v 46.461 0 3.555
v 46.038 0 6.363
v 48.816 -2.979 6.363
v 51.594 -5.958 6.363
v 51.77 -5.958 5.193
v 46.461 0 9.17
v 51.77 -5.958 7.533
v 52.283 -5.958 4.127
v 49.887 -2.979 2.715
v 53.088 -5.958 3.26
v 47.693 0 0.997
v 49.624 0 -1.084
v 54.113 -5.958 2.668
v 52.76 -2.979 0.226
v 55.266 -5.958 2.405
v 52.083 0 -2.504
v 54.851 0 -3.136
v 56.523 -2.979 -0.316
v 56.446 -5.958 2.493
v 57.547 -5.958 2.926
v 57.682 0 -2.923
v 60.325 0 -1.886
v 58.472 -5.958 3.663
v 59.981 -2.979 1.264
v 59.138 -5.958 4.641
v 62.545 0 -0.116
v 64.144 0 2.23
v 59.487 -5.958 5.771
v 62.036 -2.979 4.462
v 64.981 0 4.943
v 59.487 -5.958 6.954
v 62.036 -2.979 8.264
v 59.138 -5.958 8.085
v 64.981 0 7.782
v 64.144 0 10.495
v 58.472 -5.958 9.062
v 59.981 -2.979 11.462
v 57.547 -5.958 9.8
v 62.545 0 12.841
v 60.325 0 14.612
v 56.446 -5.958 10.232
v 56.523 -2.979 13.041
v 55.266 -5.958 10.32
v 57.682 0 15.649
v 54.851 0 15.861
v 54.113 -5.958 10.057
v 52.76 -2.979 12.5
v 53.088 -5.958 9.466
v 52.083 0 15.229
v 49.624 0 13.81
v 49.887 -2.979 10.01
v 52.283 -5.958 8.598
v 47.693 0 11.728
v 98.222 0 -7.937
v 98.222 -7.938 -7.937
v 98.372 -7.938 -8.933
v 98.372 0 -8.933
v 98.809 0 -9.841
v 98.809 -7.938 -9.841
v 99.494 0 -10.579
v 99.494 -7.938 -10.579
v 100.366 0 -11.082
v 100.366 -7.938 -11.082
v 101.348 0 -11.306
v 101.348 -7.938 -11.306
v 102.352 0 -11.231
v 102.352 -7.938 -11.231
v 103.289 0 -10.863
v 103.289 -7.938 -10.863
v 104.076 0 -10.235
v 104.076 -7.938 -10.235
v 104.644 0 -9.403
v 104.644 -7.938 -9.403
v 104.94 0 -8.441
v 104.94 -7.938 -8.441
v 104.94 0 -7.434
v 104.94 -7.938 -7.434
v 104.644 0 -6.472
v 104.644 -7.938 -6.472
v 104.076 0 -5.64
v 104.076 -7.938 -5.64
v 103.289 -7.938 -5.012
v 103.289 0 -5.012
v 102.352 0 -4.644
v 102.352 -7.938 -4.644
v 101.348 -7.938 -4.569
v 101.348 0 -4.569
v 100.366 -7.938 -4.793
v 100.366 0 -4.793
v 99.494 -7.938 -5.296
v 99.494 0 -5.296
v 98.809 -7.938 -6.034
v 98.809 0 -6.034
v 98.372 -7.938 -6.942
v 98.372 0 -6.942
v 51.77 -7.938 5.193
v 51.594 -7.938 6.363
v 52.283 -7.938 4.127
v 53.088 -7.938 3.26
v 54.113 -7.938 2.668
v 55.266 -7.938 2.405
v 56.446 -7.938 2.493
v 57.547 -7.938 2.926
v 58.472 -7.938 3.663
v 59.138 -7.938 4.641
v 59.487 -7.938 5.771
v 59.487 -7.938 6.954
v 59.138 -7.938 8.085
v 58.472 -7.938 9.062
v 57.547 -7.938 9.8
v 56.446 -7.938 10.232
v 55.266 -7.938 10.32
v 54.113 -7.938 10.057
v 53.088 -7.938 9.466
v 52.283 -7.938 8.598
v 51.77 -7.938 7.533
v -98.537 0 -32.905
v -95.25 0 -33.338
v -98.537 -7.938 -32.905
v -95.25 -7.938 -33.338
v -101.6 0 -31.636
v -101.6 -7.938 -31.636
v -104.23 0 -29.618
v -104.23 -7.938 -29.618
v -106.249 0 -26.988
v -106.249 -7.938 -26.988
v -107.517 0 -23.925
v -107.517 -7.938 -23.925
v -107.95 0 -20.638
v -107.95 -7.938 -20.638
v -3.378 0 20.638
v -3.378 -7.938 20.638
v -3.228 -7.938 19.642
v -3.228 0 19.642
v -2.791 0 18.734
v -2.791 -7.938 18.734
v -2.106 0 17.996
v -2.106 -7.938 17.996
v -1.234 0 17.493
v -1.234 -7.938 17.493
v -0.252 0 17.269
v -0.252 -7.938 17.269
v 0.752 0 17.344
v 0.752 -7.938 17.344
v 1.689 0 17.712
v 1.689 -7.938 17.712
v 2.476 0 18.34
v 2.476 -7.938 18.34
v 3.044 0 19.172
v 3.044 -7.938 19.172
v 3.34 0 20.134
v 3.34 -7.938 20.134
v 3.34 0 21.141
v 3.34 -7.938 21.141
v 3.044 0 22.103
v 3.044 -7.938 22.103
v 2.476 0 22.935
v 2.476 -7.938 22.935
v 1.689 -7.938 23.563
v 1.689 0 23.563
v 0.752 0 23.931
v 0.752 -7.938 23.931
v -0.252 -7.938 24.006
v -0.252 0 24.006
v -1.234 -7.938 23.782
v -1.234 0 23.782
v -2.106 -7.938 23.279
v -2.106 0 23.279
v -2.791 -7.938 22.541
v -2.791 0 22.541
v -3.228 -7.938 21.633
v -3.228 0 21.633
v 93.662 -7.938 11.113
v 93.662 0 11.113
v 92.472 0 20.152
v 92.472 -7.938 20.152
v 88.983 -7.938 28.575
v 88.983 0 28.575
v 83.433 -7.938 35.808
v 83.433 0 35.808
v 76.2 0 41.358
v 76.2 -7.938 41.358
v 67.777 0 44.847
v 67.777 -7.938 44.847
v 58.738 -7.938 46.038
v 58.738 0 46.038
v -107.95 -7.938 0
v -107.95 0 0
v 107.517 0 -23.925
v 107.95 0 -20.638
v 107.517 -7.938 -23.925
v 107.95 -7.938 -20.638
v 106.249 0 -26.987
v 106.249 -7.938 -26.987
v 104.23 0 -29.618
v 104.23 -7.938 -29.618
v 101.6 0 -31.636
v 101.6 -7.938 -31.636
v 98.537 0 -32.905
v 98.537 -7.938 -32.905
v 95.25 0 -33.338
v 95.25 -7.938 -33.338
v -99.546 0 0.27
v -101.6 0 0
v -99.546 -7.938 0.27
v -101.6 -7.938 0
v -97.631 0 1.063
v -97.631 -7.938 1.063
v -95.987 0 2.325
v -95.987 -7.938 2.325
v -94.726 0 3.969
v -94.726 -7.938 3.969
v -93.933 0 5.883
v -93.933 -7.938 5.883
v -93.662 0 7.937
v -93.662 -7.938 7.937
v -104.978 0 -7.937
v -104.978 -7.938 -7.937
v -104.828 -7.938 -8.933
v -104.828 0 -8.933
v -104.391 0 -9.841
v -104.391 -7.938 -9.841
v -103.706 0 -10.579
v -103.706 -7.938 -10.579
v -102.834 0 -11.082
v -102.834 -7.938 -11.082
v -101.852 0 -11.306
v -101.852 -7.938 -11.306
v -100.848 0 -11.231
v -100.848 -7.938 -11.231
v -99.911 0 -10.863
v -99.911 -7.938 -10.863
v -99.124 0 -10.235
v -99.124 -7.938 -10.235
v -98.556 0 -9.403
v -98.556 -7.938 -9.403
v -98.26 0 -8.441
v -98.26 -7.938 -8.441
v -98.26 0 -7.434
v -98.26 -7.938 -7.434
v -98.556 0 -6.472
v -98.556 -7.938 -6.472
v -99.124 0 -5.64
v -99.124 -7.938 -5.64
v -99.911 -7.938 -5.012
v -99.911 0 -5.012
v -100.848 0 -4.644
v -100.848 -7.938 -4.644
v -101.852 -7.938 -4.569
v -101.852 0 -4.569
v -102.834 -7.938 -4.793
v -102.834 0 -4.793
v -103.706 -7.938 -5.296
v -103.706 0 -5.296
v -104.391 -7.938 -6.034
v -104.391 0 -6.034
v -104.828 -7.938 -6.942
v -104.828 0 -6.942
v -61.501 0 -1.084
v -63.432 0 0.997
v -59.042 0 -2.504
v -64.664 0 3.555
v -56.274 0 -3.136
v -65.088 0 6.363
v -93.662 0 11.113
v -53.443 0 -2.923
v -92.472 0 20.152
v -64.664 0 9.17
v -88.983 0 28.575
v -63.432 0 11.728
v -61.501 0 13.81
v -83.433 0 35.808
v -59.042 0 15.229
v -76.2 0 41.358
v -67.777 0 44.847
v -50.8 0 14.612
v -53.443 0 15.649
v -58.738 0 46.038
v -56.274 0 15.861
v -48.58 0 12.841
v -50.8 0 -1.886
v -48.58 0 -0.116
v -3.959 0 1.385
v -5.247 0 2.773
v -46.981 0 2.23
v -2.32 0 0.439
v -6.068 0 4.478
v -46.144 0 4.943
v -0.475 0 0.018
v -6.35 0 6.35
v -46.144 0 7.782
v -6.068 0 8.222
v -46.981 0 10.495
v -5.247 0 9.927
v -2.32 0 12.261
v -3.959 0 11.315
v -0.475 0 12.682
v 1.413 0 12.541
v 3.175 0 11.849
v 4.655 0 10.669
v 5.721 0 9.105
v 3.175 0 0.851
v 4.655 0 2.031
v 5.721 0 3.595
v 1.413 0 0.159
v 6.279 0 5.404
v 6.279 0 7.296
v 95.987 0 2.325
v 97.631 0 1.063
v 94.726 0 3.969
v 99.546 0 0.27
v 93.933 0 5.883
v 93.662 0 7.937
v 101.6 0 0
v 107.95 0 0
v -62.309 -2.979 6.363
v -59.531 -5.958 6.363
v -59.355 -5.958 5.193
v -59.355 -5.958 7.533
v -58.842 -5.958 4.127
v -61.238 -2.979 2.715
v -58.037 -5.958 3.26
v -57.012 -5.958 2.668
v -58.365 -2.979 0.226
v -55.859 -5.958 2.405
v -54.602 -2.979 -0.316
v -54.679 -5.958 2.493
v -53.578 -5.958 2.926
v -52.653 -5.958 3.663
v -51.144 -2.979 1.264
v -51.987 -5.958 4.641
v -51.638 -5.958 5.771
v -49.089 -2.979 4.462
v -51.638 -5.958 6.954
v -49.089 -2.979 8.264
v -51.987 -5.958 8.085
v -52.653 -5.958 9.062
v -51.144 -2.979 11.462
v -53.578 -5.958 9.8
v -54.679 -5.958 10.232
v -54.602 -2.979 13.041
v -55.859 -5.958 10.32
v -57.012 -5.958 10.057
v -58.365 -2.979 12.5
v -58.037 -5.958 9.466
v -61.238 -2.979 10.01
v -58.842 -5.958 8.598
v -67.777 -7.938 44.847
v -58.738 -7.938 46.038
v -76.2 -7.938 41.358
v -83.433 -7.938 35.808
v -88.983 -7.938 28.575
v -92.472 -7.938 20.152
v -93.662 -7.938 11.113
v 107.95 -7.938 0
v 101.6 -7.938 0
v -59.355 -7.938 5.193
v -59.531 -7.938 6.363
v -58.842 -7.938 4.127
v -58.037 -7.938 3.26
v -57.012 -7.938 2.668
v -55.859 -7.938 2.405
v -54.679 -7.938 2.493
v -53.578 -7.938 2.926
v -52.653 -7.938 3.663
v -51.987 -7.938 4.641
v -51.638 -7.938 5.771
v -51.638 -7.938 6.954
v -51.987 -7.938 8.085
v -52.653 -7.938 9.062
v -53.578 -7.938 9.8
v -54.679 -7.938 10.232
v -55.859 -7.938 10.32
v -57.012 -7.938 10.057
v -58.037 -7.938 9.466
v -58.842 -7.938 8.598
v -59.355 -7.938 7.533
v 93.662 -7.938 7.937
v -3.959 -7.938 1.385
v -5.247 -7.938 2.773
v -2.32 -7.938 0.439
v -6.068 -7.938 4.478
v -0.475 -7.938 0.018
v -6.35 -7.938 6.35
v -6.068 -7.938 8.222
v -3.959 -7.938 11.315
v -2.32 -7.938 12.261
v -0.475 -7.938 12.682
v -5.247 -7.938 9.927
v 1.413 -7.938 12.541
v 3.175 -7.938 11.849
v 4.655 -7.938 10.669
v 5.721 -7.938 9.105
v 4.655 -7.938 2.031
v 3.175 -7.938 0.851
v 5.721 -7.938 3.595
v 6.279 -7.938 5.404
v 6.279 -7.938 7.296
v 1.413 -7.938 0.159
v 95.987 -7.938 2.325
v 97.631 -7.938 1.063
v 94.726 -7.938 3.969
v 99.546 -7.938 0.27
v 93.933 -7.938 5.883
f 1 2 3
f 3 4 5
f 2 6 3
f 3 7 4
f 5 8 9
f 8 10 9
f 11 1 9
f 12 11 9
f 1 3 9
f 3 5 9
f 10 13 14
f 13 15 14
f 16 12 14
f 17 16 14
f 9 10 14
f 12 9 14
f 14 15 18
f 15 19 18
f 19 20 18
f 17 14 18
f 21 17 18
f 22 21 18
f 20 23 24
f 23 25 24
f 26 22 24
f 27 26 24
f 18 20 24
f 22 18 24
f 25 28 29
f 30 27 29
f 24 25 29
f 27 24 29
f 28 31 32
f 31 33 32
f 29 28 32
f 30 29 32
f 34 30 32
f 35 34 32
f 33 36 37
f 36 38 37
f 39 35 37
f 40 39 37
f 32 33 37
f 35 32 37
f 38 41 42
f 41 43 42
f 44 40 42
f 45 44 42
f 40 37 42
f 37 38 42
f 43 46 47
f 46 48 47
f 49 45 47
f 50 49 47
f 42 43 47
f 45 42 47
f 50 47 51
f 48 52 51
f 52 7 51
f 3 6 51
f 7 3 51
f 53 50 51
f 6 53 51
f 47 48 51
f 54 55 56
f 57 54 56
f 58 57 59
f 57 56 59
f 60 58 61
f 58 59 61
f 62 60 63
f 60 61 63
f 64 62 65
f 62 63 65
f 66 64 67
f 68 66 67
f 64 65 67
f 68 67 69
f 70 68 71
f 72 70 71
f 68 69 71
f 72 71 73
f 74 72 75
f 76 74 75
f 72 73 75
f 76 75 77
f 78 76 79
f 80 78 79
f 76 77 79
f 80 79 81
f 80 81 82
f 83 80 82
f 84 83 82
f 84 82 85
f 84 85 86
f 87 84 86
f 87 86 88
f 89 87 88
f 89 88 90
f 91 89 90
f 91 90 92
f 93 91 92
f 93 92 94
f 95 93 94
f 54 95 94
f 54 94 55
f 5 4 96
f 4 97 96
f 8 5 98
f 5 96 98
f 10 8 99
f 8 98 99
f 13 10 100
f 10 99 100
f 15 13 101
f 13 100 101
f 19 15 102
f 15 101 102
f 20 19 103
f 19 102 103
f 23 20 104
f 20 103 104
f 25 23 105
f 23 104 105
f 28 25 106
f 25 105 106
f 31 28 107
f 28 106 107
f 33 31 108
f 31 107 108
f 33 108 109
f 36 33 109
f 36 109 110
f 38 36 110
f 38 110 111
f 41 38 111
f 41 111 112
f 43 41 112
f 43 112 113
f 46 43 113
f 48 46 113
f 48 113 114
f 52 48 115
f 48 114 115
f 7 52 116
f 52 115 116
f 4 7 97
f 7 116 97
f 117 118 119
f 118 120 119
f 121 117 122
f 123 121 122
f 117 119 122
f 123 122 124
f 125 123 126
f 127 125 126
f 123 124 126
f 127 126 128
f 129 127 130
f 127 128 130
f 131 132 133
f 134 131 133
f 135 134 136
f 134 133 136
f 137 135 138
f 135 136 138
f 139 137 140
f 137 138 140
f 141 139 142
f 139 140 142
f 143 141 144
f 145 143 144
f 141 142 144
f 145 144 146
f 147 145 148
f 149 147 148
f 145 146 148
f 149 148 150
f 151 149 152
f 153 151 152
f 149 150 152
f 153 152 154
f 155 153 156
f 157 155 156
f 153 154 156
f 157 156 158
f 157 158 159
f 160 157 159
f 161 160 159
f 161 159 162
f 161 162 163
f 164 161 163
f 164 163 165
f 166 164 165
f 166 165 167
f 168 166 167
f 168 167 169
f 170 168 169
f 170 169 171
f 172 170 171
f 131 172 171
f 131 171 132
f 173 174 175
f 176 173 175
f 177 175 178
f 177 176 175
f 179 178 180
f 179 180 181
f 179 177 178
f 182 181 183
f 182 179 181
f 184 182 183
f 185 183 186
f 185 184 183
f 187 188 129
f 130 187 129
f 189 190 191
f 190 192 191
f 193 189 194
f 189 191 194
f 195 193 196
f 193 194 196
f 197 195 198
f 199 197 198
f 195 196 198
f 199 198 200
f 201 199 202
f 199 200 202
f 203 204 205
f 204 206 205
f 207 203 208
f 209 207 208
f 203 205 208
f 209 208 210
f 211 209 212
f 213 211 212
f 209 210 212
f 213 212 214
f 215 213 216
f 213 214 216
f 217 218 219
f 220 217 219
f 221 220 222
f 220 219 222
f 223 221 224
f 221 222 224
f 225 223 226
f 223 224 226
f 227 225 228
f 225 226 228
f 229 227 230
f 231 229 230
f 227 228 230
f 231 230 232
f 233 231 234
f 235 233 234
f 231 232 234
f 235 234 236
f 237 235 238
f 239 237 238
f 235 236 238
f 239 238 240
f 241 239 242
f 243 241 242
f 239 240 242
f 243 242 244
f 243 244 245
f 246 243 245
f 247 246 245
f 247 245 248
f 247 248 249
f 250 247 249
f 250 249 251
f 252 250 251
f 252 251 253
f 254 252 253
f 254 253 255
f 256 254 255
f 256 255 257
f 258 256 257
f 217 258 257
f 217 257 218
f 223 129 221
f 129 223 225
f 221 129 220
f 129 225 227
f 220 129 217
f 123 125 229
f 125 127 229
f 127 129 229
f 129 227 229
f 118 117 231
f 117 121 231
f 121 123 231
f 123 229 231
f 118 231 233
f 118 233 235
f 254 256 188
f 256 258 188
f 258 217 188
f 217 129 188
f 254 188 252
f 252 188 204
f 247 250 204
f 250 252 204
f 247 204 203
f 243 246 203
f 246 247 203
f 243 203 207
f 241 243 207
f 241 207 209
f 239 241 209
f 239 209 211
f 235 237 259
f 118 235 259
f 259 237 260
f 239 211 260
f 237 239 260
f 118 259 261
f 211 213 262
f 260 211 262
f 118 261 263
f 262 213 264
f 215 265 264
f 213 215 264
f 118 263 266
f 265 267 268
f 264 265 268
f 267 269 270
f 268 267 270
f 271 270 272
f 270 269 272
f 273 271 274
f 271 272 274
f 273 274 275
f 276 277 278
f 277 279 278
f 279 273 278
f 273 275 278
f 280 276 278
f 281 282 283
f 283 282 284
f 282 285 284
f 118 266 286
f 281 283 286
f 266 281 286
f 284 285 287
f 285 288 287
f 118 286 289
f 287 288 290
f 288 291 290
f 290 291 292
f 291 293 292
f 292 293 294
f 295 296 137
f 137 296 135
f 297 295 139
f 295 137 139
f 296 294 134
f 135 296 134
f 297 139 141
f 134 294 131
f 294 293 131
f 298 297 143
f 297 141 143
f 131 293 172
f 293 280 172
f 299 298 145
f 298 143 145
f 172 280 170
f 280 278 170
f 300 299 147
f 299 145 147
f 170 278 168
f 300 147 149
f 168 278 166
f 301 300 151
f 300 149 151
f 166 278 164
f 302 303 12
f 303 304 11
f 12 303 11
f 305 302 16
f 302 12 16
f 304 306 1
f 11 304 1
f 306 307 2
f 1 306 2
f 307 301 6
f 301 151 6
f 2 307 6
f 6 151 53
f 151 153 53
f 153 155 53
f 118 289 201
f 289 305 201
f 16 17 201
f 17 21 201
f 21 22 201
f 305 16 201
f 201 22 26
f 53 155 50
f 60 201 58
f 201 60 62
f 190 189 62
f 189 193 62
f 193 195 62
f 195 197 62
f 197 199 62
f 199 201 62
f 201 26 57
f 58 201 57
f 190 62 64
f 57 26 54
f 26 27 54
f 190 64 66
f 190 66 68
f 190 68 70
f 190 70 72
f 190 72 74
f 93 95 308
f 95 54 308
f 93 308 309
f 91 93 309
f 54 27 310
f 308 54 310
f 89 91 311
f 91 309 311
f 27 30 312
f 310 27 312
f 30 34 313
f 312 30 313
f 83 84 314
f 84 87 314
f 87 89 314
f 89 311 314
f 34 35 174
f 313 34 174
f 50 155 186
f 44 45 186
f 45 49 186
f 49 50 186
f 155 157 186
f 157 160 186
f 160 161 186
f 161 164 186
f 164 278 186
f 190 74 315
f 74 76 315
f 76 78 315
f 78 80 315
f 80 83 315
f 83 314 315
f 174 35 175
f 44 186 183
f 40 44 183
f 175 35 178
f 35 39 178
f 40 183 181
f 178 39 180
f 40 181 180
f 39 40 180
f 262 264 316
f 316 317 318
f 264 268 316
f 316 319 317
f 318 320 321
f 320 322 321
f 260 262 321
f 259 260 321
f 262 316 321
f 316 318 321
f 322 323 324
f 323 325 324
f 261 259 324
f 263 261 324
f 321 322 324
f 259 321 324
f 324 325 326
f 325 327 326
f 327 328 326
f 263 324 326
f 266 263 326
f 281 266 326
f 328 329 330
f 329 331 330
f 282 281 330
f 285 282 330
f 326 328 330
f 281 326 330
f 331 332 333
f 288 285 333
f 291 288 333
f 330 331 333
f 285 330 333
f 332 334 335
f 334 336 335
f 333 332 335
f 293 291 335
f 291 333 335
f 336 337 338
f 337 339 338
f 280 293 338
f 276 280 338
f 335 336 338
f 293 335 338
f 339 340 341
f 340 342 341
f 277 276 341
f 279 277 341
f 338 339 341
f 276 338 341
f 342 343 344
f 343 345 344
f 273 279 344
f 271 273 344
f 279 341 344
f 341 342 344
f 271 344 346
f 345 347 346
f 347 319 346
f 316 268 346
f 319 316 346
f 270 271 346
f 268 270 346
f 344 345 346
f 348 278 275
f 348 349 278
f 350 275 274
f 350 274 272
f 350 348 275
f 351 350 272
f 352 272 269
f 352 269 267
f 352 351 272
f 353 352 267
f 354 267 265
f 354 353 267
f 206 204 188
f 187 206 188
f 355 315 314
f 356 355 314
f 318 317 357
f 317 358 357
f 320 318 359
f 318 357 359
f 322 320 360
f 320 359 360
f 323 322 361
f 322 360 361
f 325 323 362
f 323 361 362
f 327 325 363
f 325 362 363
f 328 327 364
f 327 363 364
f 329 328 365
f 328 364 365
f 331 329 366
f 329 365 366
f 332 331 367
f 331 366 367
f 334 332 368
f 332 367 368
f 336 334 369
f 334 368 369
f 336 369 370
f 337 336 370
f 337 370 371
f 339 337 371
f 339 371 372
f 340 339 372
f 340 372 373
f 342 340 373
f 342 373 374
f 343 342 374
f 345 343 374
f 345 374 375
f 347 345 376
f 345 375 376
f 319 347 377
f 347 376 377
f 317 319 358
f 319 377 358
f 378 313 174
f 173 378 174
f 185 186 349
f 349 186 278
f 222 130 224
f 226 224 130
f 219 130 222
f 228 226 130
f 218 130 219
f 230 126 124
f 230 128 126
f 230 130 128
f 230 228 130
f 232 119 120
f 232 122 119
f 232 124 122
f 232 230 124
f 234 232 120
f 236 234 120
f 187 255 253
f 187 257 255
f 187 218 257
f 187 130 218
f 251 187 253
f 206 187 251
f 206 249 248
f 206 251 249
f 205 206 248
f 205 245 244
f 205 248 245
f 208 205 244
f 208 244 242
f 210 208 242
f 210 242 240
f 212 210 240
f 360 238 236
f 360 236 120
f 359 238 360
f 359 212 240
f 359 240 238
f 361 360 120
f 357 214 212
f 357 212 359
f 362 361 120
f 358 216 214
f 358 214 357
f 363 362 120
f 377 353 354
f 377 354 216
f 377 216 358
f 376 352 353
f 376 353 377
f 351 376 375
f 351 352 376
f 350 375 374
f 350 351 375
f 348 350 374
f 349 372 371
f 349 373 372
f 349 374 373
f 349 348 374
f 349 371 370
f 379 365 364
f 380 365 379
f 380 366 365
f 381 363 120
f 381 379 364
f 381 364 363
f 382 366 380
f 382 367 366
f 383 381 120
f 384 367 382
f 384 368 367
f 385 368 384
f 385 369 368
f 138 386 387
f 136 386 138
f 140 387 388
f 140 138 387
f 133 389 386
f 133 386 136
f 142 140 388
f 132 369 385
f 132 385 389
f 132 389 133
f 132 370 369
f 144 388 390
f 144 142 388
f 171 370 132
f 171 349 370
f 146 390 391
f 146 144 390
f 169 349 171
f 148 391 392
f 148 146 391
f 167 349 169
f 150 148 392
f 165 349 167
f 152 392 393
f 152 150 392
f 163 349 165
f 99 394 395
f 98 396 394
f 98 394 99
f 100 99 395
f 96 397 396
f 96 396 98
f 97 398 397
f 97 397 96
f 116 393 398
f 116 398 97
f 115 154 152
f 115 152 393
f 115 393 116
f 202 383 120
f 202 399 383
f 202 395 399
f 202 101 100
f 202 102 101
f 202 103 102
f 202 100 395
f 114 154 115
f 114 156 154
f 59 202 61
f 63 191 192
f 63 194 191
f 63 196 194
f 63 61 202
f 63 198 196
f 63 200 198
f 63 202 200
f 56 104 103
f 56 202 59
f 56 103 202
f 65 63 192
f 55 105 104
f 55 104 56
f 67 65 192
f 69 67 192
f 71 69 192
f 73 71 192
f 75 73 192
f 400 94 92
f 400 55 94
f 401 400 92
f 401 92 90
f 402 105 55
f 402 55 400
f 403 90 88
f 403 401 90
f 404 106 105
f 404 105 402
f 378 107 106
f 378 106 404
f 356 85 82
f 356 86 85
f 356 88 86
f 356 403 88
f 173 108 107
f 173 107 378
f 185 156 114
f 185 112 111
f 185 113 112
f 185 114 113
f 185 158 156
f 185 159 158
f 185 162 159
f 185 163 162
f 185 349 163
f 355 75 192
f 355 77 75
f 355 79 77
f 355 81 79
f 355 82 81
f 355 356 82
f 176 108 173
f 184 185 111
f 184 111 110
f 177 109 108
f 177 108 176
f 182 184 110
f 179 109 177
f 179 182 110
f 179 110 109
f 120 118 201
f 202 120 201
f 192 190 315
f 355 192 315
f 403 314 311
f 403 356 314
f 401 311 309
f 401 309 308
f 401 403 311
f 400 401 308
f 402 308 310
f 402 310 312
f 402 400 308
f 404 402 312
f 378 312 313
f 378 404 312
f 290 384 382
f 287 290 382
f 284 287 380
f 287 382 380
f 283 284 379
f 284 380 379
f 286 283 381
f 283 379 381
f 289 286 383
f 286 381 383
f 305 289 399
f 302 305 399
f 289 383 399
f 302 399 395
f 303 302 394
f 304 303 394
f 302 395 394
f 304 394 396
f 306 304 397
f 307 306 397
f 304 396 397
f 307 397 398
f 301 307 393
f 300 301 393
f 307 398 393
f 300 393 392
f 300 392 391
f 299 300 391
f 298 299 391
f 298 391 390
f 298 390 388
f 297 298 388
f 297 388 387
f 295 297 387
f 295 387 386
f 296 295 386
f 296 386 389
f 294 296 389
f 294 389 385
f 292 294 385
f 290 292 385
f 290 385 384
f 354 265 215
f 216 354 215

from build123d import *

# Parameters (mm, degrees)
F1_DEPTH       = 7.9375
F2_R           = 34.925
F3_R           = 12.7
F4_D           = 6.7564
F5_D           = 6.7564
F6_D           = 12.7
F7_R           = 7.9375
F8_D           = 7.9375
F8_CSINK_D     = 19.05
F8_CSINK_ANGLE = 86


with BuildPart() as f1:
    # F0 (on Front) → F1 (new body)
    with BuildSketch(Plane.XZ):
        Polygon((-107.95, 0), (-107.95, -33.3375), (107.95, -33.3375), (107.95, 0), (93.6625, 0), (93.6625, 46.0375), (-93.6625, 46.0375), (-93.6625, 0), align=None)
    extrude(amount=F1_DEPTH)

    # F2
    f2_edges = [f1.edges().sort_by_distance(p)[0] for p in [
        (-93.6625, -3.96875, 46.0375),
        (93.6625, -3.96875, 46.0375),
    ]]
    fillet(f2_edges, radius=F2_R)

    # F3
    f3_edges = [f1.edges().sort_by_distance(p)[0] for p in [
        (-107.95, -3.96875, -33.3375),
        (107.95, -3.96875, -33.3375),
    ]]
    fillet(f3_edges, radius=F3_R)

    # F4 (through all)
    with Locations(Plane(origin=(0, 0, 0), x_dir=(1, 0, 0), z_dir=(0, 1, 0))):
        with Locations((-101.6, 7.9375), (101.6, 7.9375)):
            Hole(F4_D / 2)

    # F5 (through all)
    with Locations(Plane(origin=(0, 0, 0), x_dir=(1, 0, 0), z_dir=(0, 1, 0))):
        with Locations((0, -20.6375)):
            Hole(F5_D / 2)

    # F6 (through all)
    with Locations(Plane(origin=(0, 0, 0), x_dir=(1, 0, 0), z_dir=(0, 1, 0))):
        with Locations((0, -6.35)):
            Hole(F6_D / 2)

    # F7
    f7_edges = [f1.edges().sort_by_distance(p)[0] for p in [
        (-93.6625, -3.96875, 0),
        (93.6625, -3.96875, 0),
    ]]
    fillet(f7_edges, radius=F7_R)

    # F8 (through all)
    with Locations(Plane(origin=(0, 0, 0), x_dir=(1, 0, 0), z_dir=(0, 1, 0))):
        with Locations((-55.5625, -6.3627), (55.5625, -6.3627)):
            CounterSinkHole(F8_D / 2, F8_CSINK_D / 2, counter_sink_angle=F8_CSINK_ANGLE)


solid = f1.part
